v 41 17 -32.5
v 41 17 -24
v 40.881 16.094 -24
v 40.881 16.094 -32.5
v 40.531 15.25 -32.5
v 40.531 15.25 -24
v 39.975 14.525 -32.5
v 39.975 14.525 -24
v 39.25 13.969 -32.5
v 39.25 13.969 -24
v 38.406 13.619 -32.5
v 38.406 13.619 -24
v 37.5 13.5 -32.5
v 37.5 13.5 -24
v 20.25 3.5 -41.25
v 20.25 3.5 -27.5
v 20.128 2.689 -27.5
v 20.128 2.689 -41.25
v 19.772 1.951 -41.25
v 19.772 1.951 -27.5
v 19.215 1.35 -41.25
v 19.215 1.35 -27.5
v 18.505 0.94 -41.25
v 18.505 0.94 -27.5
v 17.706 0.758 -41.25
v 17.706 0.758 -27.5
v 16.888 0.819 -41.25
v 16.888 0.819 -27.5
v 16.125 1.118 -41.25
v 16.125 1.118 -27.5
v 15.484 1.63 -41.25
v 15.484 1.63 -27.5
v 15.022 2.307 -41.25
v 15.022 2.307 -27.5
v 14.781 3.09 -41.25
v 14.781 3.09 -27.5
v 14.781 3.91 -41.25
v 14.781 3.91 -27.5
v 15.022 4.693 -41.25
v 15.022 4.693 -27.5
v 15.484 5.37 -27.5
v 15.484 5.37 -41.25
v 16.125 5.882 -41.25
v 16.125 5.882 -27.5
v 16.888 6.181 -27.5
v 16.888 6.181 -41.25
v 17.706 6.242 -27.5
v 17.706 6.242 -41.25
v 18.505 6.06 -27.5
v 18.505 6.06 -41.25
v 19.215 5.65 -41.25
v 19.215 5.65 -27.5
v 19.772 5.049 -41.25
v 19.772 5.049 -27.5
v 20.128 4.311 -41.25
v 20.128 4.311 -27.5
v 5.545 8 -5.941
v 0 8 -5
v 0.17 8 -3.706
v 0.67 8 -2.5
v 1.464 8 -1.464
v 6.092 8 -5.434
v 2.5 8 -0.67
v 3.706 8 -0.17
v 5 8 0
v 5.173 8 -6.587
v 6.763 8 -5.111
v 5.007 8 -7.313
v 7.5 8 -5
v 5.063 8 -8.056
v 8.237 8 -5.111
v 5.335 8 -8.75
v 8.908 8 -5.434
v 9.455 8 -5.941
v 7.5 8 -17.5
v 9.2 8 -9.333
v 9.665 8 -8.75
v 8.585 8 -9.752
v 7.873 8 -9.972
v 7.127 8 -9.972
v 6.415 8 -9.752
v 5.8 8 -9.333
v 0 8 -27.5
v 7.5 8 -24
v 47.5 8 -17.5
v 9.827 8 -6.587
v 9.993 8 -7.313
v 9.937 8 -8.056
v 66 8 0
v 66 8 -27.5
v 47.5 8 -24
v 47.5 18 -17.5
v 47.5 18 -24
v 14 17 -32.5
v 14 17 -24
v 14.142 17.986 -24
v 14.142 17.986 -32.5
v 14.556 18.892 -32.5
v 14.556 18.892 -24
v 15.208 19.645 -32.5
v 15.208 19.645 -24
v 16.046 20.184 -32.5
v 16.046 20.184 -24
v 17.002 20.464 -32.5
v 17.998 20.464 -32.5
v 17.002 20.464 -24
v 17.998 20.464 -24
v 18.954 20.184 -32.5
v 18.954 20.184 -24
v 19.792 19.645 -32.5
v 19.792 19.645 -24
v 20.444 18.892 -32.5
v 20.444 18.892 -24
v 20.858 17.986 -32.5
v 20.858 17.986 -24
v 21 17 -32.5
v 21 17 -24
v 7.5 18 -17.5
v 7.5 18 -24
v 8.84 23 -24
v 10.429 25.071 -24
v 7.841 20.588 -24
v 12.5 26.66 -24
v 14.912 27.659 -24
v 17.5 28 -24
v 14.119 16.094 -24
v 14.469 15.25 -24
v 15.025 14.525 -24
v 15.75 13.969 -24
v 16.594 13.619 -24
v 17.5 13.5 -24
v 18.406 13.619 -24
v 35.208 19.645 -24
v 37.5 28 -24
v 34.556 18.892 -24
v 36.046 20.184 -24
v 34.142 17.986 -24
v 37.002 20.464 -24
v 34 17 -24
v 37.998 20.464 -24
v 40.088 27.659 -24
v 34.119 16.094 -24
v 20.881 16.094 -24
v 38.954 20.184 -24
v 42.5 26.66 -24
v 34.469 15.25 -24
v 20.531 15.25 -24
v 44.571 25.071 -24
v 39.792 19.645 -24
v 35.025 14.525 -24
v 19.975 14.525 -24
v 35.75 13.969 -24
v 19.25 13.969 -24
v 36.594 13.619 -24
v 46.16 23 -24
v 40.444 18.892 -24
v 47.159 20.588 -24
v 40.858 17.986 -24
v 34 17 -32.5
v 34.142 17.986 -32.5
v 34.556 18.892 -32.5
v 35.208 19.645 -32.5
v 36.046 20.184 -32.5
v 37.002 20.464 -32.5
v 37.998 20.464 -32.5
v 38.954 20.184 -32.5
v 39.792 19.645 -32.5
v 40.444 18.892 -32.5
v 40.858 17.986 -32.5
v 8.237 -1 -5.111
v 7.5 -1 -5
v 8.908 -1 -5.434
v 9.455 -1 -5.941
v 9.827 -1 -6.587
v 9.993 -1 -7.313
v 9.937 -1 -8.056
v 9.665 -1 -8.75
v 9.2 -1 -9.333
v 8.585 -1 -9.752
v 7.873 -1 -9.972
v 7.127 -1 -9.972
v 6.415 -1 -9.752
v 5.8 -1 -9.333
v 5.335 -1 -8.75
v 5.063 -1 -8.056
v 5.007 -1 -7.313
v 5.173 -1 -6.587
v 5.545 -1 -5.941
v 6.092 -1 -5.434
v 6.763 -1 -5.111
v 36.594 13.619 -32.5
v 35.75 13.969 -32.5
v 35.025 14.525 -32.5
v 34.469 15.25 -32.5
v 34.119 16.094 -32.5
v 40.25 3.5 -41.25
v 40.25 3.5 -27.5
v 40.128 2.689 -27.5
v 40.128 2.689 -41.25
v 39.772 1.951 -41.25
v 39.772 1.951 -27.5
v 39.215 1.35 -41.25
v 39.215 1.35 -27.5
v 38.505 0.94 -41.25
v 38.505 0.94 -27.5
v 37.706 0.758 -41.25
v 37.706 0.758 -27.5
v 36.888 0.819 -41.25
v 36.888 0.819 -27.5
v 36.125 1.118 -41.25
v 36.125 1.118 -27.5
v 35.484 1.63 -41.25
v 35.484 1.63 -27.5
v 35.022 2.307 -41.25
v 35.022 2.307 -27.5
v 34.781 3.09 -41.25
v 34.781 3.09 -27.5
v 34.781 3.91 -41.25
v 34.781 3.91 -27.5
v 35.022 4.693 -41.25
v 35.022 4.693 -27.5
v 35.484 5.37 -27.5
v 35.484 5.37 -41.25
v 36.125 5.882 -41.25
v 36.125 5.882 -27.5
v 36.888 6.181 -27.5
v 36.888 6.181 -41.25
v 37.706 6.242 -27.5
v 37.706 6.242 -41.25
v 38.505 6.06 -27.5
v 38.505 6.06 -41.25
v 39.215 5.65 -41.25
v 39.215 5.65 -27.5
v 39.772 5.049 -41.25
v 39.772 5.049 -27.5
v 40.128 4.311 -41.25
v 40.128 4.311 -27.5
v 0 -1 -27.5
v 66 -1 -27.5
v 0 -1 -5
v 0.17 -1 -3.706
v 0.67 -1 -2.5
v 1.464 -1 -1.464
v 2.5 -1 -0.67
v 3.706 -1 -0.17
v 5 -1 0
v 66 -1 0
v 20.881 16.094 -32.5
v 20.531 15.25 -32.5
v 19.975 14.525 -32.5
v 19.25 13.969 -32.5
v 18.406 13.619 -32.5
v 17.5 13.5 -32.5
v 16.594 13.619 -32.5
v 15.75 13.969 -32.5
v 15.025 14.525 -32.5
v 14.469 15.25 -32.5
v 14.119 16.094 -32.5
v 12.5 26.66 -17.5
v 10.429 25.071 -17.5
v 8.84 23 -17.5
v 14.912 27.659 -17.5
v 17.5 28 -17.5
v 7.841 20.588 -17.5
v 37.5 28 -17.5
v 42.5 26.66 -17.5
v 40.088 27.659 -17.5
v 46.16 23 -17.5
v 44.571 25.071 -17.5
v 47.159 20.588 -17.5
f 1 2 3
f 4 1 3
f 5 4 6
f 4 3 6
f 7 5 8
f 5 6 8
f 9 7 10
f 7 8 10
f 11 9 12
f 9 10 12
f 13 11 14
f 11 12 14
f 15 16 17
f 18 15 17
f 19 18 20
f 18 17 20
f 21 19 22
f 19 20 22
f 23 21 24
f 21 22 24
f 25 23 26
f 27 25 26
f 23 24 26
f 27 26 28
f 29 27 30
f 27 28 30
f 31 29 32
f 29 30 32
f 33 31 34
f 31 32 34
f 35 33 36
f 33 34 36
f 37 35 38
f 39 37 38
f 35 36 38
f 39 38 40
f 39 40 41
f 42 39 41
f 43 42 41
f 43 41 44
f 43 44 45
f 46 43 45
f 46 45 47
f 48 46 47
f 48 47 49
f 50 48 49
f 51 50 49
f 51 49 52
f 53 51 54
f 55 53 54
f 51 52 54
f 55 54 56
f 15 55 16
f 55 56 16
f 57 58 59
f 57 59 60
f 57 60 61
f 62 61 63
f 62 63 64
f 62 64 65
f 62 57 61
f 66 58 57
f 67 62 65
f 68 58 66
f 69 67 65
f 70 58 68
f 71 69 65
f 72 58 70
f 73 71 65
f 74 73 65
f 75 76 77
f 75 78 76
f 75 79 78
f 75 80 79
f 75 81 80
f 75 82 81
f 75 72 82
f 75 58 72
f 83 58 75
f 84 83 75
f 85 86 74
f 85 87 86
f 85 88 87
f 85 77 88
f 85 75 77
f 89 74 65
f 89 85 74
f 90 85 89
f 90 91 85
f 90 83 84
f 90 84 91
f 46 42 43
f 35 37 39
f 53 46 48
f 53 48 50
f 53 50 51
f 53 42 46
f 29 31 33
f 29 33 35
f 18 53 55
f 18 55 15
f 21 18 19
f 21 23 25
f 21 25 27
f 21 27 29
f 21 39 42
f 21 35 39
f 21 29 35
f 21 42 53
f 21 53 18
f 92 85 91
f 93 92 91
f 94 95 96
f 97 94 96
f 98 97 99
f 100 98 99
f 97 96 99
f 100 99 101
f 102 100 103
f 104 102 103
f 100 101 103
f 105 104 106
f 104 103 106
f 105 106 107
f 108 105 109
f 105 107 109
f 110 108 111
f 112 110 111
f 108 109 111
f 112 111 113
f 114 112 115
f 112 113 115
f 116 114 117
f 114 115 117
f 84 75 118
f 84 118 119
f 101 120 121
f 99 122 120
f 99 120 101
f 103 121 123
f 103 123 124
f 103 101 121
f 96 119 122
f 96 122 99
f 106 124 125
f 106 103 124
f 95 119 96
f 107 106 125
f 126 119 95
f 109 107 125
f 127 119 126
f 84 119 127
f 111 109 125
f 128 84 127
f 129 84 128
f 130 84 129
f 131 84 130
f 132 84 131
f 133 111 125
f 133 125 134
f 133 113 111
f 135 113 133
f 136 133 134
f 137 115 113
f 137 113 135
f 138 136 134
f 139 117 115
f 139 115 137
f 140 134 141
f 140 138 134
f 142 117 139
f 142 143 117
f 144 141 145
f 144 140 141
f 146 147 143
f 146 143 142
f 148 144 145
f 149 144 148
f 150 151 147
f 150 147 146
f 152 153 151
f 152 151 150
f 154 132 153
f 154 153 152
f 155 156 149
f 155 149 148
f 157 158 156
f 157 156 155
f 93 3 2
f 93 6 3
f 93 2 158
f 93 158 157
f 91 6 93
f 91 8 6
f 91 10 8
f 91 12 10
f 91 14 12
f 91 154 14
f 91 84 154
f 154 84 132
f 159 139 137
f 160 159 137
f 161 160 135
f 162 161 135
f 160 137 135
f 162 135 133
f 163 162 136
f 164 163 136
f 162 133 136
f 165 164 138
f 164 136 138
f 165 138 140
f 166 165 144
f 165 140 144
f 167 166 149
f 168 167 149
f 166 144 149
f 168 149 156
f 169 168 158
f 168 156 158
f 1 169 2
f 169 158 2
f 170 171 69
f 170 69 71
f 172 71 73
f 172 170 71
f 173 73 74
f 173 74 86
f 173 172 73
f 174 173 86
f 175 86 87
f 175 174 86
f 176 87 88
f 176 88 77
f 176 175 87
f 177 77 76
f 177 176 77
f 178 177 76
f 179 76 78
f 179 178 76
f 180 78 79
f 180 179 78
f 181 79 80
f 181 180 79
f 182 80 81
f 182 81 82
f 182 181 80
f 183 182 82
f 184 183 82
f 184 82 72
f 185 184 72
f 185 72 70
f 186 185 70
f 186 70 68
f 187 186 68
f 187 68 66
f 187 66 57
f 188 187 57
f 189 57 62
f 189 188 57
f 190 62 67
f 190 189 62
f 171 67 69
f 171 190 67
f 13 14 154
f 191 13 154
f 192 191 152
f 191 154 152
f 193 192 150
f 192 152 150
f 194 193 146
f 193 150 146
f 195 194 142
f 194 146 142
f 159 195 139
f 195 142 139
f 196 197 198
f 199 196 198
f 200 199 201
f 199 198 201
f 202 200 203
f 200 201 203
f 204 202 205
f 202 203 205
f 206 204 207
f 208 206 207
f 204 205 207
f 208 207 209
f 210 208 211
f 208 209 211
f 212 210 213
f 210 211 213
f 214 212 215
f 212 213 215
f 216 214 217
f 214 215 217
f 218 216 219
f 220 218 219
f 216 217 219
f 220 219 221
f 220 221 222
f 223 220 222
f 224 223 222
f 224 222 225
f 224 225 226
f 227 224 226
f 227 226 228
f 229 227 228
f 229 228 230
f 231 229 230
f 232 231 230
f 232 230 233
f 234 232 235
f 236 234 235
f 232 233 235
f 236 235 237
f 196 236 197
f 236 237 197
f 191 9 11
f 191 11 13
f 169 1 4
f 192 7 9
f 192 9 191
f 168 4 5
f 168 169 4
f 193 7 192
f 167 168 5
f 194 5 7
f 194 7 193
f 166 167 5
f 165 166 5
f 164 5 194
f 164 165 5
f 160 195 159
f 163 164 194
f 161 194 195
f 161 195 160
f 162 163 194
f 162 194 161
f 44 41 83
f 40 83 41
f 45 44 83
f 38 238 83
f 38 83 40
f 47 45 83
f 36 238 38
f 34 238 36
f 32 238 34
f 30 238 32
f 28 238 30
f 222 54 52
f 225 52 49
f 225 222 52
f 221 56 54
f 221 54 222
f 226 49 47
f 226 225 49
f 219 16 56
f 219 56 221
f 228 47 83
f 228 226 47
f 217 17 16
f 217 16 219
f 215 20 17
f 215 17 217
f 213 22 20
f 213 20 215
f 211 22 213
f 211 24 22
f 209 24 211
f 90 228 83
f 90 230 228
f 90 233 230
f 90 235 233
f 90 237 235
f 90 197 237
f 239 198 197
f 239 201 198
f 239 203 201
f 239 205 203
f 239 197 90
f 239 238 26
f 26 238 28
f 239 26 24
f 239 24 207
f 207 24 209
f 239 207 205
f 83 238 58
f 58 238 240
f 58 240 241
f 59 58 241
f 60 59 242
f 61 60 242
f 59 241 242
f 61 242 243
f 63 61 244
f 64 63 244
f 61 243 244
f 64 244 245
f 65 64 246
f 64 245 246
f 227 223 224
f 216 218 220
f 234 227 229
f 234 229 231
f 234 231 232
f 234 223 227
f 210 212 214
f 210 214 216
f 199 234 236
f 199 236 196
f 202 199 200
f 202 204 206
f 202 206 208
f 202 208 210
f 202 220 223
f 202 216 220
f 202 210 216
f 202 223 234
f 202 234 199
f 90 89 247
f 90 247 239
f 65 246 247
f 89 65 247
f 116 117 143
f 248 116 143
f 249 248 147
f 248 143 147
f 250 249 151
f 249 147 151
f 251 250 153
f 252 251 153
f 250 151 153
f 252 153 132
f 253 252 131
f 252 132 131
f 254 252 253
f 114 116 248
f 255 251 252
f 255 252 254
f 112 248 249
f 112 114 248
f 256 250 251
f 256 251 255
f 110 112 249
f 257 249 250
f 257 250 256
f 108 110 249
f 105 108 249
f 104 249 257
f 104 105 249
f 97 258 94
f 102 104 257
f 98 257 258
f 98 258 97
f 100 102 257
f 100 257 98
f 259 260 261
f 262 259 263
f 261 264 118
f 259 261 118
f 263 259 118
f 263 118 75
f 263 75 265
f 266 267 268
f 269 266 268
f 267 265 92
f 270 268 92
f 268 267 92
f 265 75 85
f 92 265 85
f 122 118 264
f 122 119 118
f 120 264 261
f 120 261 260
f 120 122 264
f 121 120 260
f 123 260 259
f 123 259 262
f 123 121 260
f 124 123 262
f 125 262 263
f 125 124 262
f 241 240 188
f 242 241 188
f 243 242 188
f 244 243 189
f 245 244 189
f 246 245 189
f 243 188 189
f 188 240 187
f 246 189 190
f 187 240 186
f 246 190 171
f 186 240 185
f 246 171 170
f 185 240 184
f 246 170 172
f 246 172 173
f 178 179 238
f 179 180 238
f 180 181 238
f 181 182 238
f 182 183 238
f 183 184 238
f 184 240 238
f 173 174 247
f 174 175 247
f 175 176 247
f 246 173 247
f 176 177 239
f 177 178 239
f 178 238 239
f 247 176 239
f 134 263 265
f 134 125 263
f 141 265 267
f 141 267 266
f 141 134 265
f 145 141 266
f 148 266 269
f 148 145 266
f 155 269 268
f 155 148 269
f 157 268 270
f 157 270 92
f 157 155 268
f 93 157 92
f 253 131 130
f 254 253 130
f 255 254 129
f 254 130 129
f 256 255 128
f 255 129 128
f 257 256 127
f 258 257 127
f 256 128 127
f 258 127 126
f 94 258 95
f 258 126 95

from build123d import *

# Parameters (mm, degrees)
BOSS_EXTRUDE2_DEPTH      = 8
BOSS_EXTRUDE2_DEPTH_BACK = 1
SKETCH1_R                = 2.5
CUT_EXTRUDE1_START       = -16
SKETCH2_R                = 2.5
CUT_EXTRUDE1_DEPTH       = 16
SKETCH3_R                = 2.75
BOSS_EXTRUDE3_DEPTH      = 13.75
SKETCH4_W                = 9
SKETCH4_H                = 6.5
BOSS_EXTRUDE4_DEPTH      = 15
BOSS_EXTRUDE5_DEPTH      = 8.5
SKETCH8_W                = 9
SKETCH8_H                = 6.5
BOSS_EXTRUDE6_DEPTH      = 5
SKETCH9_W                = 15.5
SKETCH9_H                = 6.5
BOSS_EXTRUDE7_DEPTH      = 20
SKETCH10_R               = 3.5
BOSS_EXTRUDE8_DEPTH      = 8.5
CUT_EXTRUDE2_START       = -8.5
SKETCH12_R               = 3.5
CUT_EXTRUDE2_DEPTH       = 8.5
FILLET1_R                = 10
BOSS_EXTRUDE9_DEPTH      = 11
BOSS_EXTRUDE9_DEPTH_BACK = 11
SKETCH13_W               = 27.5
SKETCH13_H               = 9


with BuildPart() as part:
    # Sketch1 → Boss-Extrude2 (new, two sides: drawn at the far end of the back side and taken through both)
    with BuildSketch(Plane(origin=(0, 0, 0), x_dir=(1, 0, 0), z_dir=(0, 1, 0)).offset(-BOSS_EXTRUDE2_DEPTH_BACK)):
        with BuildLine():
            Line((5, 0), (50, 0))
            ThreePointArc((50, 0), (53.535533906, 1.464466094), (55, 5))
            Line((55, 5), (55, 50))
            ThreePointArc((55, 50), (53.535533906, 53.535533906), (50, 55))
            Line((50, 55), (5, 55))
            ThreePointArc((5, 55), (1.464466094, 53.535533906), (0, 50))
            Line((0, 50), (0, 5))
            ThreePointArc((0, 5), (1.464466094, 1.464466094), (5, 0))
        make_face()
        with Locations((7.5, 47.5)):
            Circle(SKETCH1_R, mode=Mode.SUBTRACT)
        with Locations((47.5, 47.5)):
            Circle(SKETCH1_R, mode=Mode.SUBTRACT)
        with Locations((47.5, 7.5)):
            Circle(SKETCH1_R, mode=Mode.SUBTRACT)
        with Locations((7.5, 7.5)):
            Circle(SKETCH1_R, mode=Mode.SUBTRACT)
    extrude(amount=BOSS_EXTRUDE2_DEPTH + BOSS_EXTRUDE2_DEPTH_BACK)

    # Sketch2 → Cut-Extrude1 (cut)
    with BuildSketch(Plane(origin=(0, 8, 0), x_dir=(1, 0, 0), z_dir=(0, 1, 0)).offset(CUT_EXTRUDE1_START)):
        with BuildLine():
            Line((0, 50), (0, 27.5))
            Line((0, 27.5), (55, 27.5))
            Line((55, 27.5), (55, 50))
            ThreePointArc((55, 50), (53.535533906, 53.535533906), (50, 55))
            Line((50, 55), (5, 55))
            ThreePointArc((5, 55), (1.464466094, 53.535533906), (0, 50))
        make_face()
        with Locations((7.5, 47.5)):
            Circle(SKETCH2_R, mode=Mode.SUBTRACT)
        with Locations((47.5, 47.5)):
            Circle(SKETCH2_R, mode=Mode.SUBTRACT)
    extrude(amount=CUT_EXTRUDE1_DEPTH, mode=Mode.SUBTRACT)

    # Sketch3 → Boss-Extrude3 (add)
    with BuildSketch(Plane(origin=(0, 0, -27.5), x_dir=(-1, 0, 0), z_dir=(0, 0, -1))):
        with Locations((-37.5, 3.5)):
            Circle(SKETCH3_R)
        with Locations((-17.5, 3.5)):
            Circle(SKETCH3_R)
    extrude(amount=BOSS_EXTRUDE3_DEPTH)

    # Sketch4 → Boss-Extrude4 (add)
    with BuildSketch(Plane(origin=(0, 8, 0), x_dir=(1, 0, 0), z_dir=(0, 1, 0))):
        with Locations((27.5, 20.75)):
            Rectangle(SKETCH4_W, SKETCH4_H)
    extrude(amount=BOSS_EXTRUDE4_DEPTH)

    # Sketch5 → Boss-Extrude5 (add)
    with BuildSketch(Plane(origin=(0, 0, -24), x_dir=(-1, 0, 0), z_dir=(0, 0, -1))):
        with BuildLine():
            ThreePointArc((-25.636419782, 13.037388184), (-24.436298745, 14.307742745), (-24, 16))
            ThreePointArc((-24, 16), (-29.974873734, 18.474873734), (-27.5, 12.5))
            ThreePointArc((-27.5, 12.5), (-26.685966178, 12.595980474), (-25.916578842, 12.878657751))
            ThreePointArc((-25.916578842, 12.878657751), (-25.85405917, 13.094916041), (-25.636419782, 13.037388184))
        make_face()
    extrude(amount=BOSS_EXTRUDE5_DEPTH)

    # Sketch8 → Boss-Extrude6 (add)
    with BuildSketch(Plane(origin=(0, 23, 0), x_dir=(1, 0, 0), z_dir=(0, 1, 0))):
        with Locations((27.5, 20.75)):
            Rectangle(SKETCH8_W, SKETCH8_H)
    extrude(amount=BOSS_EXTRUDE6_DEPTH)

    # Sketch9 → Boss-Extrude7 (add)
    with BuildSketch(Plane(origin=(0, 8, 0), x_dir=(1, 0, 0), z_dir=(0, 1, 0))):
        with Locations((39.75, 20.75)):
            Rectangle(SKETCH9_W, SKETCH9_H)
        with Locations((15.25, 20.75)):
            Rectangle(SKETCH9_W, SKETCH9_H)
    extrude(amount=BOSS_EXTRUDE7_DEPTH)

    # Sketch10 → Boss-Extrude8 (add)
    with BuildSketch(Plane(origin=(0, 0, -24), x_dir=(-1, 0, 0), z_dir=(0, 0, -1))):
        with Locations((-17.5, 17)):
            Circle(SKETCH10_R)
        with Locations((-37.5, 17)):
            Circle(SKETCH10_R)
    extrude(amount=BOSS_EXTRUDE8_DEPTH)

    # Sketch12 → Cut-Extrude2 (cut)
    with BuildSketch(Plane(origin=(0, 0, -32.5), x_dir=(-1, 0, 0), z_dir=(0, 0, -1)).offset(CUT_EXTRUDE2_START)):
        with Locations((-27.5, 16)):
            Circle(SKETCH12_R)
    extrude(amount=CUT_EXTRUDE2_DEPTH, mode=Mode.SUBTRACT)

    # Fillet1
    fillet1_edges = [part.edges().sort_by_distance(p)[0] for p in [
        (47.5, 28, -20.75),
        (7.5, 28, -20.75),
    ]]
    fillet(fillet1_edges, radius=FILLET1_R)

    # Sketch13 → Boss-Extrude9 (add, two sides: drawn at the far end of the back side and taken through both)
    with BuildSketch(Plane(origin=(55, 0, 0), x_dir=(0, 0, -1), z_dir=(1, 0, 0)).offset(-BOSS_EXTRUDE9_DEPTH_BACK)):
        with Locations((13.75, 3.5)):
            Rectangle(SKETCH13_W, SKETCH13_H)
    extrude(amount=BOSS_EXTRUDE9_DEPTH + BOSS_EXTRUDE9_DEPTH_BACK)


solid = part.part
